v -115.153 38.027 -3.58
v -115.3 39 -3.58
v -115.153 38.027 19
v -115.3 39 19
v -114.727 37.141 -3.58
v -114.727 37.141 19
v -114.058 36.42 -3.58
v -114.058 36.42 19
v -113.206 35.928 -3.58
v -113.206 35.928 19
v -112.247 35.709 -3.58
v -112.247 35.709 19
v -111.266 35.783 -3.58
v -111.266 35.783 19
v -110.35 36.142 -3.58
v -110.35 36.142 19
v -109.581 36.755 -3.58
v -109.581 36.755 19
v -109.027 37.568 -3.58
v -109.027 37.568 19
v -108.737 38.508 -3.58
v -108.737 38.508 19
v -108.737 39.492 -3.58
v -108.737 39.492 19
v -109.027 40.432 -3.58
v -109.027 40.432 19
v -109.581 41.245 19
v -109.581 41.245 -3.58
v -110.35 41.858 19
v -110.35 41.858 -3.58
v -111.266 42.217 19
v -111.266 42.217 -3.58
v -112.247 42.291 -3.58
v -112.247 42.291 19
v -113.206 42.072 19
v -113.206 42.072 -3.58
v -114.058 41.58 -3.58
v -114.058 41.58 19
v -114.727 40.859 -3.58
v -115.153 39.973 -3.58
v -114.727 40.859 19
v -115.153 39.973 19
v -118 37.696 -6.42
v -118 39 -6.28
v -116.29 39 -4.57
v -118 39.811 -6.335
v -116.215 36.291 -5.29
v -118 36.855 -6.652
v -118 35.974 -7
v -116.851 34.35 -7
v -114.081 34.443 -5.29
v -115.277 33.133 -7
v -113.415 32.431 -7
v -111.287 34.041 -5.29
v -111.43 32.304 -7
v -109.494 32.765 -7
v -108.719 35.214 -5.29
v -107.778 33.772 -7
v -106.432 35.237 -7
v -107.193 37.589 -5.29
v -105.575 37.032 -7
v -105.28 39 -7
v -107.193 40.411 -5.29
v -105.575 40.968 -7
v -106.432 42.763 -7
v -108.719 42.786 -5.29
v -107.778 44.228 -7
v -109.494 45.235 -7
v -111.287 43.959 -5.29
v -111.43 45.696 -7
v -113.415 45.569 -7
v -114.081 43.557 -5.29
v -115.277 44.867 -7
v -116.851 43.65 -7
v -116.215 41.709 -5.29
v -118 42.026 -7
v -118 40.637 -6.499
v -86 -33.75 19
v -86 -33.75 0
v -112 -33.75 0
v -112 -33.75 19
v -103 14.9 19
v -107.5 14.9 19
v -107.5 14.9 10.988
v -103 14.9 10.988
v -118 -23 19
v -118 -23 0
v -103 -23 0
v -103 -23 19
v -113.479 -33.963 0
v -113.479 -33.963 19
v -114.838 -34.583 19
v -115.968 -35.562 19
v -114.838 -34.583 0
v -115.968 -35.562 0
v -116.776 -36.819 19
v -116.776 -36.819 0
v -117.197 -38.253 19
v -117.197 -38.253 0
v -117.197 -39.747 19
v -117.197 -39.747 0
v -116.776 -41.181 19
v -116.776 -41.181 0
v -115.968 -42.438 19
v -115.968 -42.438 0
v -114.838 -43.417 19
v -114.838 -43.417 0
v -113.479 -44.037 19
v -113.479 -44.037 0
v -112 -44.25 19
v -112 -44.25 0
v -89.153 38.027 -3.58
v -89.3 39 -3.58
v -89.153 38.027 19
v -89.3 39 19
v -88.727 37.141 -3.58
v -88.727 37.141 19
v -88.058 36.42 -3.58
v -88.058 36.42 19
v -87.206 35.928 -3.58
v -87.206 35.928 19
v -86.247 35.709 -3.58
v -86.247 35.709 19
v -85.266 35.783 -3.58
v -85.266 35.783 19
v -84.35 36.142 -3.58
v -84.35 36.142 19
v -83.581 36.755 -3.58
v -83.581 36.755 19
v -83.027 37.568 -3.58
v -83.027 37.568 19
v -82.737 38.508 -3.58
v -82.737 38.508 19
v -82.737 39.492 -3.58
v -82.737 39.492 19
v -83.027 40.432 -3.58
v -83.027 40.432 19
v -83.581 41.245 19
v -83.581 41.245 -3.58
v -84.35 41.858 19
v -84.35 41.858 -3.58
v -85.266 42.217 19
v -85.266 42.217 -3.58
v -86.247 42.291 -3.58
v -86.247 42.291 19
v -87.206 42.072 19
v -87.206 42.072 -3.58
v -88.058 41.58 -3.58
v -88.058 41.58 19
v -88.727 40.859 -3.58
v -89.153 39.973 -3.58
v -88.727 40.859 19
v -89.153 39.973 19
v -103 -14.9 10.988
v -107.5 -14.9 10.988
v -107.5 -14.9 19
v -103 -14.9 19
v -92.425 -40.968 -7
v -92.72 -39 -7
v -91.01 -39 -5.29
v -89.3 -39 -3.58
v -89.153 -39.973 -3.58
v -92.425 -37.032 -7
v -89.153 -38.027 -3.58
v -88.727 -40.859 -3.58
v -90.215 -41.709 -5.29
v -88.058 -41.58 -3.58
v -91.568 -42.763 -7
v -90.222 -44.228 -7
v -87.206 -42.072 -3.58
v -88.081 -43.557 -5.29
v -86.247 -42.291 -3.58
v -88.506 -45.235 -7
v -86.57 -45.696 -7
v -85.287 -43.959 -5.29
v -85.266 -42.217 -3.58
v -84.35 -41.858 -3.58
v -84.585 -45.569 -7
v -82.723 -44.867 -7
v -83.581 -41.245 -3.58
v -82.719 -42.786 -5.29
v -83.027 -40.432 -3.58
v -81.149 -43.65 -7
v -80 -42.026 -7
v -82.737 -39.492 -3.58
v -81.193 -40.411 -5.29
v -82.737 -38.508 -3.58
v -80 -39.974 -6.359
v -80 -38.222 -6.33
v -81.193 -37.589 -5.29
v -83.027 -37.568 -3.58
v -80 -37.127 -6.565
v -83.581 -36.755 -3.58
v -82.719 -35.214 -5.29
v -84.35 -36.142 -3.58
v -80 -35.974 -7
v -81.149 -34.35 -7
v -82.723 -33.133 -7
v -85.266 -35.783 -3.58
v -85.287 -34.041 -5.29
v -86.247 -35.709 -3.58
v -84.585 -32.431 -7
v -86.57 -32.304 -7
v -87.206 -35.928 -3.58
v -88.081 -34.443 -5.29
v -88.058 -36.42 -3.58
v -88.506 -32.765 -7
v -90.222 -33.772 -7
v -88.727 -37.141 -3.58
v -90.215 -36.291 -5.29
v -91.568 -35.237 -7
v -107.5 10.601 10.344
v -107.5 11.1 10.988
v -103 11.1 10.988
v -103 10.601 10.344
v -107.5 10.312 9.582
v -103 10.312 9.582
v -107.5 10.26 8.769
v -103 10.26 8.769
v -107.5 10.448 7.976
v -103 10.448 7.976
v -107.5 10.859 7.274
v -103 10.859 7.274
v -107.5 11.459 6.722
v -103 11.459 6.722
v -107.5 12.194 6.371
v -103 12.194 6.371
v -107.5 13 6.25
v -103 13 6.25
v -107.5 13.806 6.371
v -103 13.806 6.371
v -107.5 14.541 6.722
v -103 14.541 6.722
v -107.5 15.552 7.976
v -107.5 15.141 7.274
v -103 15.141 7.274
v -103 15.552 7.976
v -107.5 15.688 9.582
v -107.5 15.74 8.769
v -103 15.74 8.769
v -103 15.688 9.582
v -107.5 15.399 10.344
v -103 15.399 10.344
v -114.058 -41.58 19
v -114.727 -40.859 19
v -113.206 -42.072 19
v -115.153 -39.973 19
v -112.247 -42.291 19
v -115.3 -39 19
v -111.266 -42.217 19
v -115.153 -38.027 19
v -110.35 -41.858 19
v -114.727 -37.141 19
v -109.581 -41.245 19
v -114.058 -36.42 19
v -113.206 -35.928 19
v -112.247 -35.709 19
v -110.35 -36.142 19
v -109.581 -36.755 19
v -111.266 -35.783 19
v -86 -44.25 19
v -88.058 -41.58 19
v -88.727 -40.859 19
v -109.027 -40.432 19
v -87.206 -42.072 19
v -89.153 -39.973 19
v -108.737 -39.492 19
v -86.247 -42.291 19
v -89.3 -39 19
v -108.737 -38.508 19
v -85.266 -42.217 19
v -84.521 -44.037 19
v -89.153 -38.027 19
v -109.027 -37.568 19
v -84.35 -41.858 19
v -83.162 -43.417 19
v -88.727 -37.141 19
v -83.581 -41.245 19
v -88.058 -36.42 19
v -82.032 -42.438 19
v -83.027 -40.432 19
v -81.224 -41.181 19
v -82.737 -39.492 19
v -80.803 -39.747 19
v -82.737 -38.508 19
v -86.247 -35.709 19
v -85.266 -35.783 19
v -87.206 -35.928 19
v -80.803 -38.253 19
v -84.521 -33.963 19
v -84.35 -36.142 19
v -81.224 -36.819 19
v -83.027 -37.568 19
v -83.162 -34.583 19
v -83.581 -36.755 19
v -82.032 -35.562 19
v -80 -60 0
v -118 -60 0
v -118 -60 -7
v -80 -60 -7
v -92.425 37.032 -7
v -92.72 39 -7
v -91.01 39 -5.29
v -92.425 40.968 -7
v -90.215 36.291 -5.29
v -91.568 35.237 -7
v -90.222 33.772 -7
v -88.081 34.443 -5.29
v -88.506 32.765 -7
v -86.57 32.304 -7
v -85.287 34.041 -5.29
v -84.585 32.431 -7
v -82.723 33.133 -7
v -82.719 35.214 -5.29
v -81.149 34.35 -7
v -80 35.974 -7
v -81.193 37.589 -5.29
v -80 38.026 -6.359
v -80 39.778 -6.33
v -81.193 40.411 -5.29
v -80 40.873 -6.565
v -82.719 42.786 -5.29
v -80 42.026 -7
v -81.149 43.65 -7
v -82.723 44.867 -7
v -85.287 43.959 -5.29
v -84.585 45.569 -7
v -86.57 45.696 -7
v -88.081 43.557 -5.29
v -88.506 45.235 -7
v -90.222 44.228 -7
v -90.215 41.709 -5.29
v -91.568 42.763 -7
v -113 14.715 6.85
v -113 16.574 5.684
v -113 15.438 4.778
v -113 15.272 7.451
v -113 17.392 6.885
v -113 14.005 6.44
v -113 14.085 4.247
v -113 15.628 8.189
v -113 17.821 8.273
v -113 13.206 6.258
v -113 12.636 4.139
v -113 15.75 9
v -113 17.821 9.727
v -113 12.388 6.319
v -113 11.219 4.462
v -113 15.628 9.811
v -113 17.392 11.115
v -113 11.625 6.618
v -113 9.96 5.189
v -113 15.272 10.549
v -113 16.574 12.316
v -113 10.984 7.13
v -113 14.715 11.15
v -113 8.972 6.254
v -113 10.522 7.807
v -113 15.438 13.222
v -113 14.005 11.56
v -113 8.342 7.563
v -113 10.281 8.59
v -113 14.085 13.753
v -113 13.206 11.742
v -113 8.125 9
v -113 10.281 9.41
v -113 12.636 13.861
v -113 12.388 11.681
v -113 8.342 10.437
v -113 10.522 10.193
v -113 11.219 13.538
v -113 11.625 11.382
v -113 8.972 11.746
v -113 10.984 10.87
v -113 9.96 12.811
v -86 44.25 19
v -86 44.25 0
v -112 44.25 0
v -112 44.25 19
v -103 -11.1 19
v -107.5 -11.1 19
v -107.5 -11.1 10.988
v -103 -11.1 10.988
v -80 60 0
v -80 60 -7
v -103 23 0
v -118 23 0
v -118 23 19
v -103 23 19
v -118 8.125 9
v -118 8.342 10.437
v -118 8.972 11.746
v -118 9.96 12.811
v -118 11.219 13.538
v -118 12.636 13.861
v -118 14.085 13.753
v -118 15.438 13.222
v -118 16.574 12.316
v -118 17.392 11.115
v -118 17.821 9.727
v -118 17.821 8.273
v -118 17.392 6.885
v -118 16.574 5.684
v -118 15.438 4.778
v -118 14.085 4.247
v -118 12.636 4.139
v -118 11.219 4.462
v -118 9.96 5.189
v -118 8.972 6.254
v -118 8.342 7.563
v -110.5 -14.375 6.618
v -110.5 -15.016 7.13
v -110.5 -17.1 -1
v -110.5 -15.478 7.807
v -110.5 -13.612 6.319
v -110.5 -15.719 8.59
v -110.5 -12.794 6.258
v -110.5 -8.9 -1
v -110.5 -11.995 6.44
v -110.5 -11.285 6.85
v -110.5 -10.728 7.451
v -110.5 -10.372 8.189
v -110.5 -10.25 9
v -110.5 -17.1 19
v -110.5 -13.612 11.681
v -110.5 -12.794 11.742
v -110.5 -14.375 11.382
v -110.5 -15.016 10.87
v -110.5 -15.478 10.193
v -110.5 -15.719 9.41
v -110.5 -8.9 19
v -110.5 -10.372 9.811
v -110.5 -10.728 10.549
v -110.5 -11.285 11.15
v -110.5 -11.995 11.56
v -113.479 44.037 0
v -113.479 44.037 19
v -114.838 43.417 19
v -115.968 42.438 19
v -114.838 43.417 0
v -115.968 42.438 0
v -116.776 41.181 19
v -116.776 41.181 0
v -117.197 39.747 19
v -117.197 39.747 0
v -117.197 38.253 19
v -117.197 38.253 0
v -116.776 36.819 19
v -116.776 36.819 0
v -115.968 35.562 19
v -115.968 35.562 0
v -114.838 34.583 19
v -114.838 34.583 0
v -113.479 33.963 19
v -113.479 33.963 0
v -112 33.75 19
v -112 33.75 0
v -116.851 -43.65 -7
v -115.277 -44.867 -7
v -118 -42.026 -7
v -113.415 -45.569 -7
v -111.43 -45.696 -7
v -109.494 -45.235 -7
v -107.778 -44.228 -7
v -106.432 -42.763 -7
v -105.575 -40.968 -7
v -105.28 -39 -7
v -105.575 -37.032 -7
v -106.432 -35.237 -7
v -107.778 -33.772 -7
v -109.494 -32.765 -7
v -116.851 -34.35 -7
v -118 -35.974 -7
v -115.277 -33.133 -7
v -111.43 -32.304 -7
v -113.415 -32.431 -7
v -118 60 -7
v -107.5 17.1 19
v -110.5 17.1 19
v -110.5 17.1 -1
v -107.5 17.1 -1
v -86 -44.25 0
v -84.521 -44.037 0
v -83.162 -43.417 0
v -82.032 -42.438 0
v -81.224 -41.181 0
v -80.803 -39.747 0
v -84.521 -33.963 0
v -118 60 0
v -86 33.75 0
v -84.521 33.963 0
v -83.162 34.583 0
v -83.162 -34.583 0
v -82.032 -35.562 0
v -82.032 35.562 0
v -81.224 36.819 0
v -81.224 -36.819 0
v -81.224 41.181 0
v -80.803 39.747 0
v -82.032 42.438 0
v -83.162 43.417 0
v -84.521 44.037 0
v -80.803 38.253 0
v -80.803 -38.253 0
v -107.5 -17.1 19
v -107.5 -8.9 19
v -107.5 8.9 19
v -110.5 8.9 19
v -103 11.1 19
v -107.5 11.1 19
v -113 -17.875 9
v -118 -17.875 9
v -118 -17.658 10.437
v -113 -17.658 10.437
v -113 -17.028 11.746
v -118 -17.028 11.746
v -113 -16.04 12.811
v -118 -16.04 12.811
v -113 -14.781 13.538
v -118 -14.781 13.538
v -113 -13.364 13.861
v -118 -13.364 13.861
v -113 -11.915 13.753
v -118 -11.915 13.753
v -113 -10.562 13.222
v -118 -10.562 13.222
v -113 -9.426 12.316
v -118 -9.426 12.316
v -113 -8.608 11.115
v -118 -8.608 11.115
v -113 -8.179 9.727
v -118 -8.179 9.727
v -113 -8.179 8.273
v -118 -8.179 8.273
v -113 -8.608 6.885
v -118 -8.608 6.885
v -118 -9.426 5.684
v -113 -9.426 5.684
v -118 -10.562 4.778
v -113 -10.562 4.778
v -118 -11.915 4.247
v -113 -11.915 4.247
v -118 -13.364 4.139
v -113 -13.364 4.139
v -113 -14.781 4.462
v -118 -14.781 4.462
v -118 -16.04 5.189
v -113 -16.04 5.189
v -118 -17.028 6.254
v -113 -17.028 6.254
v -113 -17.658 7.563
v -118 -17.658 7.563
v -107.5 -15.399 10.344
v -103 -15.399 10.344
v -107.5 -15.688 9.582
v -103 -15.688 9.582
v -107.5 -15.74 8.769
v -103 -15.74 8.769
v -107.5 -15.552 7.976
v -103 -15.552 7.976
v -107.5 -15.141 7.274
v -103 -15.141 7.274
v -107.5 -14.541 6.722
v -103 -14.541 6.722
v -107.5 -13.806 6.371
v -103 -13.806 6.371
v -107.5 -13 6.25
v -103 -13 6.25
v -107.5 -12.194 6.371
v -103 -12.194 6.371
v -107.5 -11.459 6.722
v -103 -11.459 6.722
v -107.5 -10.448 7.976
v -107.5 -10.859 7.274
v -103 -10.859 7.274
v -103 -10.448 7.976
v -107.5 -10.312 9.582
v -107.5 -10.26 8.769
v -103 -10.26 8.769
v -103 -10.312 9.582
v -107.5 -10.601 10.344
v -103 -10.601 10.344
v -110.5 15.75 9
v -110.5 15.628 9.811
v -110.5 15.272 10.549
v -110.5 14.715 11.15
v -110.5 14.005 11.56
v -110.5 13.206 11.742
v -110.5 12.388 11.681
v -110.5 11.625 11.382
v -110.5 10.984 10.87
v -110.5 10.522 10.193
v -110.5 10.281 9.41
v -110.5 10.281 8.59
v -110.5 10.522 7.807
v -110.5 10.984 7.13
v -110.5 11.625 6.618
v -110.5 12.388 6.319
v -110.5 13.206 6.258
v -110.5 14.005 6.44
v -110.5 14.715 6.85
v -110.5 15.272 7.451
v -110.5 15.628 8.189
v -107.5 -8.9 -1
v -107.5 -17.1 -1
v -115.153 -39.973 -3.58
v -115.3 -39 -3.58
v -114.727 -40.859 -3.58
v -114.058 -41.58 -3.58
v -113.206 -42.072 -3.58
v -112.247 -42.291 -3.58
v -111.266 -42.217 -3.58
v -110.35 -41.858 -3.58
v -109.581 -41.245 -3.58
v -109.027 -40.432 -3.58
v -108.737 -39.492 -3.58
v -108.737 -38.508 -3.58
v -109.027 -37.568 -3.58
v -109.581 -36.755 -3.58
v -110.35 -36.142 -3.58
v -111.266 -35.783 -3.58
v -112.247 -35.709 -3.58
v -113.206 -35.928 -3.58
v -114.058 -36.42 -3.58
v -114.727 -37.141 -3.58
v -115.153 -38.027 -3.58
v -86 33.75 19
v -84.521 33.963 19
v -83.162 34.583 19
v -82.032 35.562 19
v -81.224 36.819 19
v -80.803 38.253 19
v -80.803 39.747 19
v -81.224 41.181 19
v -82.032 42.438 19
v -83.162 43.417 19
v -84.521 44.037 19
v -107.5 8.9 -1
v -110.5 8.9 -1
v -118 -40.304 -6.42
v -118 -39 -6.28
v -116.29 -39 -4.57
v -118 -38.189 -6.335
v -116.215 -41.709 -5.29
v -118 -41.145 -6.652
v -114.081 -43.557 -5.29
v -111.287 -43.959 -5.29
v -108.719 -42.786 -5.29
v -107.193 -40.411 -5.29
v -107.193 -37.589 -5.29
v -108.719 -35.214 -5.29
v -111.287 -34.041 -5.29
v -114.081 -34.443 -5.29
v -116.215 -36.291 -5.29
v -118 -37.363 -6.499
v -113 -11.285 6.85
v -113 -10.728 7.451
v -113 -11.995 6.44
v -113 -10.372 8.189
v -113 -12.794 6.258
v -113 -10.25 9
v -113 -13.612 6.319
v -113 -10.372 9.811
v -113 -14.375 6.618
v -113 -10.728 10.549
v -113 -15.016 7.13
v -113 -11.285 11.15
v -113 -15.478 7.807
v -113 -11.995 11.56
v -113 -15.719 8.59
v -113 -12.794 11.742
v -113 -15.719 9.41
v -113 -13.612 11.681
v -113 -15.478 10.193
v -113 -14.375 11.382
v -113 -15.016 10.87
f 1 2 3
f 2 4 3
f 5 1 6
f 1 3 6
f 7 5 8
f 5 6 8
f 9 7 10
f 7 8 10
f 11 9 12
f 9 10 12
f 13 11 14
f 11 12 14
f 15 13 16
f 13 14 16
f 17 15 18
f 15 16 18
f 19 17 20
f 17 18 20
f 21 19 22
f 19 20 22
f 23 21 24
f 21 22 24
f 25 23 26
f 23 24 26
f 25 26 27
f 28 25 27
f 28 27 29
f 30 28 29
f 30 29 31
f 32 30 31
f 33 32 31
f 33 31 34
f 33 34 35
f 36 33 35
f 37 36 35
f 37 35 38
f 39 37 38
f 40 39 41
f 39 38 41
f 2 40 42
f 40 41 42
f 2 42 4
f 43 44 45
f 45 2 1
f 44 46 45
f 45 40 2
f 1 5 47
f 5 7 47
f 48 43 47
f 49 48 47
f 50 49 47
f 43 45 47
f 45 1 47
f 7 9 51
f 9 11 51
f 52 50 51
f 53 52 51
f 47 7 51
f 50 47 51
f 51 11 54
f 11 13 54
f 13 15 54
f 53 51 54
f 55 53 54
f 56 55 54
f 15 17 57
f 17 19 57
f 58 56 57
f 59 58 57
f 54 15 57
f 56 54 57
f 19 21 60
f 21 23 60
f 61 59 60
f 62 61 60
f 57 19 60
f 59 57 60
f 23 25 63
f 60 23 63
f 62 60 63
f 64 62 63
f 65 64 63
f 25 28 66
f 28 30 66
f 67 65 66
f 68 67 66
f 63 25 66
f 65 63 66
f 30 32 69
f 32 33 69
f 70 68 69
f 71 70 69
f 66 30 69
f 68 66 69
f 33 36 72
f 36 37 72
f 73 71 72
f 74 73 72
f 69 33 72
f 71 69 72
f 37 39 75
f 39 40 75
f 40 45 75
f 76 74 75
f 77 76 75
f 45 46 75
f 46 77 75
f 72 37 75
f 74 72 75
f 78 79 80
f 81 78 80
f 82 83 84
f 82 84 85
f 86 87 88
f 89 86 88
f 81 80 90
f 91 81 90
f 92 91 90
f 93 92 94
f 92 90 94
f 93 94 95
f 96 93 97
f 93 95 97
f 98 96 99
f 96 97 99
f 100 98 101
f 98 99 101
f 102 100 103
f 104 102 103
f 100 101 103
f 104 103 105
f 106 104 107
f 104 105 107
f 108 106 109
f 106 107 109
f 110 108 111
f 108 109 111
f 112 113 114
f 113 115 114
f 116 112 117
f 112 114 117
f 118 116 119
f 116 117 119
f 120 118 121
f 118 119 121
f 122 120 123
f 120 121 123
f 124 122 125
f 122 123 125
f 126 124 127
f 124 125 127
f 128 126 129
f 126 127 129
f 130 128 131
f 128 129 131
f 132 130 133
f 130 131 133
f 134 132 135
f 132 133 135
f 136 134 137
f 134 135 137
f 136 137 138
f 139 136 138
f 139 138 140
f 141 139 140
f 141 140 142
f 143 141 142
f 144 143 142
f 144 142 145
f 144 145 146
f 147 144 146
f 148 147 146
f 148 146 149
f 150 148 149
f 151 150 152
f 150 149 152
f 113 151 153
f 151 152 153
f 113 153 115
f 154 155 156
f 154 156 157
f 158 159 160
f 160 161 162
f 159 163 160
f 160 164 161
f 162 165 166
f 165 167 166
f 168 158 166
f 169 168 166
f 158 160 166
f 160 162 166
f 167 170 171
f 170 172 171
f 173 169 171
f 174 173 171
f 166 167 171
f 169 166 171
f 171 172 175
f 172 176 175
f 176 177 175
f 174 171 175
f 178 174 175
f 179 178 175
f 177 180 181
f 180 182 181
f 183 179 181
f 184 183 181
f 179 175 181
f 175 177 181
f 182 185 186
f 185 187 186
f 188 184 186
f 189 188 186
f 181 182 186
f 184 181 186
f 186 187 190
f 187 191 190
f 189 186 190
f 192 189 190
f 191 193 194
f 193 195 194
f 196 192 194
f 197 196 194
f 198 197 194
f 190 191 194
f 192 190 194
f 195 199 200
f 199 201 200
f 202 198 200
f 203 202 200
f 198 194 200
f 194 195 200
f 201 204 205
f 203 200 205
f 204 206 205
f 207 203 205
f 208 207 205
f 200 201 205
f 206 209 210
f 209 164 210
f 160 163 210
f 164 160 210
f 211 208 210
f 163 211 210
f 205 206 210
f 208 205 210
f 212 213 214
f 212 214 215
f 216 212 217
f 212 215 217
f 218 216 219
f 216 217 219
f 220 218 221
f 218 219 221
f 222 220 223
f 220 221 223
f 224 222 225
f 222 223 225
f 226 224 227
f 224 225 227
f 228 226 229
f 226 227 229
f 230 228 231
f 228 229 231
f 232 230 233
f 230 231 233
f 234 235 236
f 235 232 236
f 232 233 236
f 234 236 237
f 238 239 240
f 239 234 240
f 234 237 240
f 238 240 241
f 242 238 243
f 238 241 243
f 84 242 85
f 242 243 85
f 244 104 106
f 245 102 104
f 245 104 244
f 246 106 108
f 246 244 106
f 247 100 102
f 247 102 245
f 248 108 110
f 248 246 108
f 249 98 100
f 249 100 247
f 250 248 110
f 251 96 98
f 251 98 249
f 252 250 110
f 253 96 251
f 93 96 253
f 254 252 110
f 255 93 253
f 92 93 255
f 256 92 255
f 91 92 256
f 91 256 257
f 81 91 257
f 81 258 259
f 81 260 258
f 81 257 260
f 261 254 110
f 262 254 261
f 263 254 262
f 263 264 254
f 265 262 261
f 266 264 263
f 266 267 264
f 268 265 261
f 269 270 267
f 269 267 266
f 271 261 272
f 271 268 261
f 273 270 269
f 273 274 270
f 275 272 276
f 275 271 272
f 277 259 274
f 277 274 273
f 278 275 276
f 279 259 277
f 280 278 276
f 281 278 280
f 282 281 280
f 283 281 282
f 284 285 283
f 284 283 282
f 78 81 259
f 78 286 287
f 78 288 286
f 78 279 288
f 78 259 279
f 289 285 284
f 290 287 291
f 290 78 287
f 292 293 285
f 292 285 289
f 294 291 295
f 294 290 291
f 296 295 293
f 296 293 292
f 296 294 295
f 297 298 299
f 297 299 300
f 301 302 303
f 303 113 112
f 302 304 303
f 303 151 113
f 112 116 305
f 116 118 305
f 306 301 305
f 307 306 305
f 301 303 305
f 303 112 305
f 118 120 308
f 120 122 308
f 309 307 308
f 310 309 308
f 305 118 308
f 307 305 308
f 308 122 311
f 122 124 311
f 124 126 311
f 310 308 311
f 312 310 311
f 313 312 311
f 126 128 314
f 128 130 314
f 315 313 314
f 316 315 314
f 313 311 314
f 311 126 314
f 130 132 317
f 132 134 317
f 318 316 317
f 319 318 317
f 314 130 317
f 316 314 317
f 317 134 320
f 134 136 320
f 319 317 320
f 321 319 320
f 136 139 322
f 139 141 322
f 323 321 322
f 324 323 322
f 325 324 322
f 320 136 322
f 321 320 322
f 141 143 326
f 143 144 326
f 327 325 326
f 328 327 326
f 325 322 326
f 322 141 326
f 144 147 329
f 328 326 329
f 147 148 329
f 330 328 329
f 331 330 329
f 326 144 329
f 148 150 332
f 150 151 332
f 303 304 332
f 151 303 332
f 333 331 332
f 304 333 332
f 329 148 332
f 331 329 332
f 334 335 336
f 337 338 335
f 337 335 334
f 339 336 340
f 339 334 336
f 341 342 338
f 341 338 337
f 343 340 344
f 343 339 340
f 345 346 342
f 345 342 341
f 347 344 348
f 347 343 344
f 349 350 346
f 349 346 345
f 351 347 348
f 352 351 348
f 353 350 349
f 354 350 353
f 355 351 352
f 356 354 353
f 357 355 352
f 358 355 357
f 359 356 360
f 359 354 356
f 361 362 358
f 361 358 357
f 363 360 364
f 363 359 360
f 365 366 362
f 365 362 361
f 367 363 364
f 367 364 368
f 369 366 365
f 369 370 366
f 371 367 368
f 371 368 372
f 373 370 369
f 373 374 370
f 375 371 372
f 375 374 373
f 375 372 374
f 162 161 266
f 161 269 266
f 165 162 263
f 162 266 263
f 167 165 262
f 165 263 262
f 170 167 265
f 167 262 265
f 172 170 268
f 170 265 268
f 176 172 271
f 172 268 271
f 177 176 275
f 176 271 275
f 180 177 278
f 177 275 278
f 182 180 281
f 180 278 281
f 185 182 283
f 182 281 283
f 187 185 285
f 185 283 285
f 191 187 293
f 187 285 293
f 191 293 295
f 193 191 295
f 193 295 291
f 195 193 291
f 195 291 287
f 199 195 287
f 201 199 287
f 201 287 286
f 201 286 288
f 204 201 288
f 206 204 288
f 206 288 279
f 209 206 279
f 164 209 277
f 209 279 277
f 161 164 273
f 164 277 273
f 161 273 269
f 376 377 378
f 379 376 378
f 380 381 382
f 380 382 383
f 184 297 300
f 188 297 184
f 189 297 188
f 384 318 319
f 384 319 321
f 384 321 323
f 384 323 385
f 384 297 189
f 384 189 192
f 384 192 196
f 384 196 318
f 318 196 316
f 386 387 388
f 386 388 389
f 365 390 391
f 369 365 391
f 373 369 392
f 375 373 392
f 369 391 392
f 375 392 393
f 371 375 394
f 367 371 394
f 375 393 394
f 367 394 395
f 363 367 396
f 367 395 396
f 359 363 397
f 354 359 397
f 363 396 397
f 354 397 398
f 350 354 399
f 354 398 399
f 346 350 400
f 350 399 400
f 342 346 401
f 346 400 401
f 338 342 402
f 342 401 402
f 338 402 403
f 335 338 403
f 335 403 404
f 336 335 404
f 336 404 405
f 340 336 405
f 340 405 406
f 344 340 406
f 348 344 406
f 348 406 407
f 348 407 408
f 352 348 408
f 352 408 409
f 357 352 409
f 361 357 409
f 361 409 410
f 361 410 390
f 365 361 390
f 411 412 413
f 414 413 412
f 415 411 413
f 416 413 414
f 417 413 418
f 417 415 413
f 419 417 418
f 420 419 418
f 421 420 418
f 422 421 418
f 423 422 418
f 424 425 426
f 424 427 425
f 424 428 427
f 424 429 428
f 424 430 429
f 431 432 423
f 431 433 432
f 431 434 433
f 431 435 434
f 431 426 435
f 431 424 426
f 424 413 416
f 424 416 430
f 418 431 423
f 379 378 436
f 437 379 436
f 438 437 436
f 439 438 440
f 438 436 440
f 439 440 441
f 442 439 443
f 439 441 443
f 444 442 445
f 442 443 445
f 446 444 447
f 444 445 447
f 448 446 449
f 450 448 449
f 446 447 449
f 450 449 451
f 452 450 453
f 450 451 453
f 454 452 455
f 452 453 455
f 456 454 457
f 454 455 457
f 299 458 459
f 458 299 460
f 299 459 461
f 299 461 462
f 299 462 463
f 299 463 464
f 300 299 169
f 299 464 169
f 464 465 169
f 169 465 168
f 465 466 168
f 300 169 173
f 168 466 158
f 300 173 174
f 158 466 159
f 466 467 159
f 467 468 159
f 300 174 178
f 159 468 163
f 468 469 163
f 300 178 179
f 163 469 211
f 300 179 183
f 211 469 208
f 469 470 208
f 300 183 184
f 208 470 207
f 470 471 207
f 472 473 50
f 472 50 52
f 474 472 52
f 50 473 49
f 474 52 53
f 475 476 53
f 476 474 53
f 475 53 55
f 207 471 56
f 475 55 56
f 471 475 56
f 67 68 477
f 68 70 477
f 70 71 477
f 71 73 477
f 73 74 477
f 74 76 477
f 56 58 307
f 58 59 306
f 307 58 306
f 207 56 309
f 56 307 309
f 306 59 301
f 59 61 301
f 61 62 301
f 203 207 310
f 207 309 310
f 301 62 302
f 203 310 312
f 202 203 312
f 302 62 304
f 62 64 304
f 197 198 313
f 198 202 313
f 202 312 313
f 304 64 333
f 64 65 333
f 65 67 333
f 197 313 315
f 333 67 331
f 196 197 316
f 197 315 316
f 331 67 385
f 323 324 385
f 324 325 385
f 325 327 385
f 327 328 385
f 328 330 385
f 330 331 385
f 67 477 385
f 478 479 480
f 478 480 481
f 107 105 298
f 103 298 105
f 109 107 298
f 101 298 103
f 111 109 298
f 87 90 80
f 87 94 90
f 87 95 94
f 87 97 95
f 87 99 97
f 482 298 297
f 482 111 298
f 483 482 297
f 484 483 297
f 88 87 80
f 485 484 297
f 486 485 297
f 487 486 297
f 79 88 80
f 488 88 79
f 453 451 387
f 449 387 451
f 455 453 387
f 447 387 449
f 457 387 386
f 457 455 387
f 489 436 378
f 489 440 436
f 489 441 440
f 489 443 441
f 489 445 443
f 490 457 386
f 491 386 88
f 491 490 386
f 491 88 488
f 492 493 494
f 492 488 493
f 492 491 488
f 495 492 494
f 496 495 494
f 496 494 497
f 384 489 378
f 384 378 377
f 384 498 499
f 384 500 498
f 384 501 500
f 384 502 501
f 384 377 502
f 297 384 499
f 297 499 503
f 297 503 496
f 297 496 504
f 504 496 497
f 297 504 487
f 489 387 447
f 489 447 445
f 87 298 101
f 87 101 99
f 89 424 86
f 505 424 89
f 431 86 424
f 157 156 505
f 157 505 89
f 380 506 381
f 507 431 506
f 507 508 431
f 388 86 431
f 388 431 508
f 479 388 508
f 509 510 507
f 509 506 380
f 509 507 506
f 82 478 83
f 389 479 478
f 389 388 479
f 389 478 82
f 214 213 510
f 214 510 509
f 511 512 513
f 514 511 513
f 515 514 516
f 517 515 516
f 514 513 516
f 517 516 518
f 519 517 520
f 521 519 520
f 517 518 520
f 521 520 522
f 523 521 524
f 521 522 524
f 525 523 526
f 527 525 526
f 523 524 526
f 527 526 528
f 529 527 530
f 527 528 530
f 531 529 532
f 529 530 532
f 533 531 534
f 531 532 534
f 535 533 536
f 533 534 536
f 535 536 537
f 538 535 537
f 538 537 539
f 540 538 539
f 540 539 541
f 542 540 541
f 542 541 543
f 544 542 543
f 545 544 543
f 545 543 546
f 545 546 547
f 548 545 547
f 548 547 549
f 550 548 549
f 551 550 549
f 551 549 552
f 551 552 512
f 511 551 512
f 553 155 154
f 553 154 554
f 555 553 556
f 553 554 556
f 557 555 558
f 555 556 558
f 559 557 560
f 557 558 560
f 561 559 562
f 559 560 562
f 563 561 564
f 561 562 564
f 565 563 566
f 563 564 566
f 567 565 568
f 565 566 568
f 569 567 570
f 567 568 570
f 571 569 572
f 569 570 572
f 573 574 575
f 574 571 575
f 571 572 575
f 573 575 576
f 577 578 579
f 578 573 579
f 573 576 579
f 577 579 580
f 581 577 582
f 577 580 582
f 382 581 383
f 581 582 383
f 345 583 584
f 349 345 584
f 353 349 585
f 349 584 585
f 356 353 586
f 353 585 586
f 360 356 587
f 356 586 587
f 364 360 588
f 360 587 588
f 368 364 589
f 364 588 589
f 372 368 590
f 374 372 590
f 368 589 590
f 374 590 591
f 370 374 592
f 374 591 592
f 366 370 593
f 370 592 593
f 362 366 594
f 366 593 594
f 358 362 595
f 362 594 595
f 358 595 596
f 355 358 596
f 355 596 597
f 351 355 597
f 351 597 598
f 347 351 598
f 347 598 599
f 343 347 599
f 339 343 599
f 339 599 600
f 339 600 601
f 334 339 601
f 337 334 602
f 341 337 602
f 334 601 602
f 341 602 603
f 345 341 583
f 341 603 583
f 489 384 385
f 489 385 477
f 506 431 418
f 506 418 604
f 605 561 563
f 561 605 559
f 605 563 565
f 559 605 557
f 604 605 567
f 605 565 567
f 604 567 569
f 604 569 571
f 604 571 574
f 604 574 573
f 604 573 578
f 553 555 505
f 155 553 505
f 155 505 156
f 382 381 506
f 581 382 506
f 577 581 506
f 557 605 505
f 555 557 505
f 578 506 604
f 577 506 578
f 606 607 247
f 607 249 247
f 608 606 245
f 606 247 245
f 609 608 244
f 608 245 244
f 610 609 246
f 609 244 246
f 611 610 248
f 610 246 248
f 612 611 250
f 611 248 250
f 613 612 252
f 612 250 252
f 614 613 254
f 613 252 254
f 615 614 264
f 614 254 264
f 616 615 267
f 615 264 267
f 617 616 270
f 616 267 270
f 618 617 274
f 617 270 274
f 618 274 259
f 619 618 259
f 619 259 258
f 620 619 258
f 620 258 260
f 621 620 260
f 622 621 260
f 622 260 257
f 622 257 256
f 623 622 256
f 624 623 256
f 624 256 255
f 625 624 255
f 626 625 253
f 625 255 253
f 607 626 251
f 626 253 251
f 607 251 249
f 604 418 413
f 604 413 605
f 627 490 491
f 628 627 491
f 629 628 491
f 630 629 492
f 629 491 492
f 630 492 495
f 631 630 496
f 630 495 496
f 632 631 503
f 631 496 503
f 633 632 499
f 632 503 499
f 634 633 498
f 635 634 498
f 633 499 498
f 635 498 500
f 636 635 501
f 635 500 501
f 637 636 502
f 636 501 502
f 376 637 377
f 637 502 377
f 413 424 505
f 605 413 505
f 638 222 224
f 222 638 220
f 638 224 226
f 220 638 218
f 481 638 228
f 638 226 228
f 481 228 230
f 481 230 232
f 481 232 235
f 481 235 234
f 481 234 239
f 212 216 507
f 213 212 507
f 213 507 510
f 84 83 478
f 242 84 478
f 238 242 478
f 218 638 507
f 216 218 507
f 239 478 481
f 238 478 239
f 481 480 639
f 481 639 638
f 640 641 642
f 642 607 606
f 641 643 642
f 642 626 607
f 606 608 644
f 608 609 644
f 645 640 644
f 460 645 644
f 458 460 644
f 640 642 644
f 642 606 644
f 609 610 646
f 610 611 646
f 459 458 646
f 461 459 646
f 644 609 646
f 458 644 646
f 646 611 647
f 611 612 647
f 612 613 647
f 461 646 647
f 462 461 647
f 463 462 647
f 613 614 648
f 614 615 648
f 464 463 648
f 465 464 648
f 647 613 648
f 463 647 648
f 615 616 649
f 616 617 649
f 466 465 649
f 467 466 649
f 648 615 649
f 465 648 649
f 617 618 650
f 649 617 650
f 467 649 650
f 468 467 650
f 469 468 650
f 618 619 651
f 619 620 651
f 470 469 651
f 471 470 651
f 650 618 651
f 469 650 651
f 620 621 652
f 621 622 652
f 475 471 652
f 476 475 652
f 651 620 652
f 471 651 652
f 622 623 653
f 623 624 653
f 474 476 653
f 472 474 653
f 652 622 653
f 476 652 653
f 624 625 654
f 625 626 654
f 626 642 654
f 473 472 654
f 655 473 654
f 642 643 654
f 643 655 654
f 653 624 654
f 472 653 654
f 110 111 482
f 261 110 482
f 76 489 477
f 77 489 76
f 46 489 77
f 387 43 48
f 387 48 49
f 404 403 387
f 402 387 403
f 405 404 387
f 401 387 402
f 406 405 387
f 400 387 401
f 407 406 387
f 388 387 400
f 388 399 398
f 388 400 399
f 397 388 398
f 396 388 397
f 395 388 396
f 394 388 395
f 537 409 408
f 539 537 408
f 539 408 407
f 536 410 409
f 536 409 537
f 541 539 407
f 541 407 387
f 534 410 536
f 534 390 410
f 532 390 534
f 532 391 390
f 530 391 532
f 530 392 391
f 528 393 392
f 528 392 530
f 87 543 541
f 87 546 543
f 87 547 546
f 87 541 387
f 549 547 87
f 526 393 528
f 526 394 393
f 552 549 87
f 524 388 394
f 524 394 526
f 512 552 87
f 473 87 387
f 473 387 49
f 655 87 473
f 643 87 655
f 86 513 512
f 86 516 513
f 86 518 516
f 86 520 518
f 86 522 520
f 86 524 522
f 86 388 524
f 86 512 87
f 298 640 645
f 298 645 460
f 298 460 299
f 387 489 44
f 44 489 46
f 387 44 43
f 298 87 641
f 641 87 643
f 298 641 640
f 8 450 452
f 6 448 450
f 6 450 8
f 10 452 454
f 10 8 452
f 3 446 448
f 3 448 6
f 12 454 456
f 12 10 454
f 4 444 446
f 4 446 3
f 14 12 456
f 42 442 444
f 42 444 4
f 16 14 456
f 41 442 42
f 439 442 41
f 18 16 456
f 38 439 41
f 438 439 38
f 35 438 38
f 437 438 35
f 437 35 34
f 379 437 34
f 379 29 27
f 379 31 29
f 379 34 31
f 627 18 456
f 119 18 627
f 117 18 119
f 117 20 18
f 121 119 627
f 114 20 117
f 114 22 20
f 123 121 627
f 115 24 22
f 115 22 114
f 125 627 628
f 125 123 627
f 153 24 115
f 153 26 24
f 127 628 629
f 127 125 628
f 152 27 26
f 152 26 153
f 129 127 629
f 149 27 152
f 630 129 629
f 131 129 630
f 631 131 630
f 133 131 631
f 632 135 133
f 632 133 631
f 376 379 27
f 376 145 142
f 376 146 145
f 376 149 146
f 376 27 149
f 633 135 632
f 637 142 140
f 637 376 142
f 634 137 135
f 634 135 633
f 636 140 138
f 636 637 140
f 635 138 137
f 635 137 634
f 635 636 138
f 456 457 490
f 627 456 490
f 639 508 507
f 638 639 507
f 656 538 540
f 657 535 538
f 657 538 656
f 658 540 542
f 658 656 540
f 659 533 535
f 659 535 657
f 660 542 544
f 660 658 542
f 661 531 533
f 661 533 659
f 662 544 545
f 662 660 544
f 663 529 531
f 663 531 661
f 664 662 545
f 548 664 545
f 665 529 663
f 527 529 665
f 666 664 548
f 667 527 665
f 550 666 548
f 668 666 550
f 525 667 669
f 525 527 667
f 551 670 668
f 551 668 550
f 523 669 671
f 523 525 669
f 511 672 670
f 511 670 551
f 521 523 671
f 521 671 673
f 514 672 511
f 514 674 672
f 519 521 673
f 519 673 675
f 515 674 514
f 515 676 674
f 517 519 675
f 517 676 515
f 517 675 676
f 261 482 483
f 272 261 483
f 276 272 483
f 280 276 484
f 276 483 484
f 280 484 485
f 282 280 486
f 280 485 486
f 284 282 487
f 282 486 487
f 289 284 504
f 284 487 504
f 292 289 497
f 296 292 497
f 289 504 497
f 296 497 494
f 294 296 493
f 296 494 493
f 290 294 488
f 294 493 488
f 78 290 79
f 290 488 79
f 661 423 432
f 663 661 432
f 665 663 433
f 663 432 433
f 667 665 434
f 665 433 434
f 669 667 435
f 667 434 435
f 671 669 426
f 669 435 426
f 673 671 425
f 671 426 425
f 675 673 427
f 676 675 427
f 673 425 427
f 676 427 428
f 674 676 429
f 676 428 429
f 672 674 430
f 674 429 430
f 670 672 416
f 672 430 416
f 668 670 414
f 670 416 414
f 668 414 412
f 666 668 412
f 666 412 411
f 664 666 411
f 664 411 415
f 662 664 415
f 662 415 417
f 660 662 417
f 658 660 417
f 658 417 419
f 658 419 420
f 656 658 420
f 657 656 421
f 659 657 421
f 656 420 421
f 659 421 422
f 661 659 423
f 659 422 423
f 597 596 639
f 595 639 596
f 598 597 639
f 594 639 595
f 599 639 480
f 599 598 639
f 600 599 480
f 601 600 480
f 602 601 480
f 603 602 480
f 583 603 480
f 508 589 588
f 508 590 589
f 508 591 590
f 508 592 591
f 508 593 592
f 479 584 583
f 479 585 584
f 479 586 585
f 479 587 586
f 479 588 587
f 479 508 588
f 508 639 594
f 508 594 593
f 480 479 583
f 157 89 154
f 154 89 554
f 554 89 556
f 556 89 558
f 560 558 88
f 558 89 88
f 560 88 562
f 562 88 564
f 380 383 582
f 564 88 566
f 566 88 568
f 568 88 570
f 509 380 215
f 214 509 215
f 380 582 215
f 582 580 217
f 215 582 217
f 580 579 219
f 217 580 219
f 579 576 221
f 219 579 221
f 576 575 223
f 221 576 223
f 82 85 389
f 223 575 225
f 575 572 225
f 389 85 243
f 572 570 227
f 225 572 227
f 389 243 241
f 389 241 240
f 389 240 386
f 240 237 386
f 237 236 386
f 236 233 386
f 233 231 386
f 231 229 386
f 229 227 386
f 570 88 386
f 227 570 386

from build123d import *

# Parameters (mm, degrees)
F0_W           = 15
F0_H           = 46
F0_R           = 2.5
F1_DEPTH       = 7
F2_DEPTH       = 19
F4_D           = 5.5
F4_CBORE_D     = 9.75
F4_CBORE_DEPTH = 5
F5_W           = 3
F5_H           = 8.2
F6_DEPTH       = 20
F8_D           = 6.6
F8_DEPTH       = 40
F8_CSINK_D     = 13.44
F8_CSINK_ANGLE = 90
F8_TIP         = 1.9828400428
F9_W           = 4.5
F9_H           = 3.8
F10_DEPTH      = 10


# Not quite as in the source:
# - a feature names something its author has since deleted; it is built from what else it names


with BuildPart() as f1:
    # F0 (on Top) → F1 (new body)
    with BuildSketch(Plane.XY):
        Polygon((-80, -60), (-80, 60), (-118, 60), (-118, 23), (-103, 23), (-103, -23), (-118, -23), (-118, -60), align=None)
        with BuildLine():
            Line((-86, -44.25), (-112, -44.25))
            ThreePointArc((-112, -44.25), (-117.25, -39), (-112, -33.75))
            Line((-112, -33.75), (-86, -33.75))
            ThreePointArc((-86, -33.75), (-80.75, -39), (-86, -44.25))
        make_face(mode=Mode.SUBTRACT)
        with BuildLine():
            Line((-86, 33.75), (-112, 33.75))
            ThreePointArc((-112, 33.75), (-117.25, 39), (-112, 44.25))
            Line((-112, 44.25), (-86, 44.25))
            ThreePointArc((-86, 44.25), (-80.75, 39), (-86, 33.75))
        make_face(mode=Mode.SUBTRACT)
        with Locations((-110.5, 0)):
            Rectangle(F0_W, F0_H)
        with BuildLine():
            ThreePointArc((-112, 44.25), (-117.25, 39), (-112, 33.75))
            Line((-112, 33.75), (-86, 33.75))
            ThreePointArc((-86, 33.75), (-80.75, 39), (-86, 44.25))
            Line((-86, 44.25), (-112, 44.25))
        make_face()
        with Locations((-112, 39)):
            Circle(F0_R, mode=Mode.SUBTRACT)
        with Locations((-86, 39)):
            Circle(F0_R, mode=Mode.SUBTRACT)
        with BuildLine():
            ThreePointArc((-112, -33.75), (-117.25, -39), (-112, -44.25))
            Line((-112, -44.25), (-86, -44.25))
            ThreePointArc((-86, -44.25), (-80.75, -39), (-86, -33.75))
            Line((-86, -33.75), (-112, -33.75))
        make_face()
        with Locations((-112, -39)):
            Circle(F0_R, mode=Mode.SUBTRACT)
        with BuildLine():
            ThreePointArc((-83.5, -39), (-86, -41.5), (-88.5, -39))
            ThreePointArc((-88.5, -39), (-86, -36.5), (-83.5, -39))
        make_face(mode=Mode.SUBTRACT)
        with Locations((-112, 39)):
            Circle(F0_R)
        with Locations((-86, 39)):
            Circle(F0_R)
        with Locations((-112, -39)):
            Circle(F0_R)
        with BuildLine():
            ThreePointArc((-83.5, -39), (-86, -36.5), (-88.5, -39))
            ThreePointArc((-88.5, -39), (-86, -41.5), (-83.5, -39))
        make_face()
    extrude(amount=-F1_DEPTH)

    # F0 (on Top) → F2 (join)
    with BuildSketch(Plane.XY):
        with BuildLine():
            ThreePointArc((-112, 44.25), (-117.25, 39), (-112, 33.75))
            Line((-112, 33.75), (-86, 33.75))
            ThreePointArc((-86, 33.75), (-80.75, 39), (-86, 44.25))
            Line((-86, 44.25), (-112, 44.25))
        make_face()
        with Locations((-112, 39)):
            Circle(F0_R, mode=Mode.SUBTRACT)
        with Locations((-86, 39)):
            Circle(F0_R, mode=Mode.SUBTRACT)
        with BuildLine():
            ThreePointArc((-112, -33.75), (-117.25, -39), (-112, -44.25))
            Line((-112, -44.25), (-86, -44.25))
            ThreePointArc((-86, -44.25), (-80.75, -39), (-86, -33.75))
            Line((-86, -33.75), (-112, -33.75))
        make_face()
        with Locations((-112, -39)):
            Circle(F0_R, mode=Mode.SUBTRACT)
        with BuildLine():
            ThreePointArc((-83.5, -39), (-86, -41.5), (-88.5, -39))
            ThreePointArc((-88.5, -39), (-86, -36.5), (-83.5, -39))
        make_face(mode=Mode.SUBTRACT)
        with Locations((-110.5, 0)):
            Rectangle(F0_W, F0_H)
        with Locations((-112, 39)):
            Circle(F0_R)
        with Locations((-86, 39)):
            Circle(F0_R)
        with BuildLine():
            ThreePointArc((-83.5, -39), (-86, -36.5), (-88.5, -39))
            ThreePointArc((-88.5, -39), (-86, -41.5), (-83.5, -39))
        make_face()
        with Locations((-112, -39)):
            Circle(F0_R)
    extrude(amount=F2_DEPTH)

    # F4 (through all)
    with Locations(Plane(origin=(-118, 0, 0), x_dir=(0, -1, 0), z_dir=(-1, 0, 0))):
        with Locations((-13, 9), (13, 9)):
            CounterBoreHole(F4_D / 2, F4_CBORE_D / 2, F4_CBORE_DEPTH)

    # F5 (on face) → F6 (cut)
    with BuildSketch(Plane.XY.offset(19)):
        with Locations((-109, 13)):
            Rectangle(F5_W, F5_H)
        with Locations((-109, -13)):
            Rectangle(F5_W, F5_H)
    extrude(amount=-F6_DEPTH, mode=Mode.SUBTRACT)

    # F8
    with Locations(Plane(origin=(0, 0, -7), x_dir=(1, 0, 0), z_dir=(0, 0, -1))):
        with Locations((-86, -39), (-112, -39), (-112, 39), (-86, 39)):
            CounterSinkHole(F8_D / 2, F8_CSINK_D / 2, depth=F8_DEPTH, counter_sink_angle=F8_CSINK_ANGLE)
            with Locations((0, 0, -(F8_DEPTH + F8_TIP / 2))):  # 118° drill point
                Cone(0, F8_D / 2, F8_TIP, mode=Mode.SUBTRACT)

    # F9 (on face) → F10 (cut)
    with BuildSketch(Plane.XY.offset(19)):
        with Locations((-105.25, 13)):
            Rectangle(F9_W, F9_H)
        with Locations((-105.25, -13)):
            Rectangle(F9_W, F9_H)
    extrude(amount=-F10_DEPTH, mode=Mode.SUBTRACT)


solid = f1.part
